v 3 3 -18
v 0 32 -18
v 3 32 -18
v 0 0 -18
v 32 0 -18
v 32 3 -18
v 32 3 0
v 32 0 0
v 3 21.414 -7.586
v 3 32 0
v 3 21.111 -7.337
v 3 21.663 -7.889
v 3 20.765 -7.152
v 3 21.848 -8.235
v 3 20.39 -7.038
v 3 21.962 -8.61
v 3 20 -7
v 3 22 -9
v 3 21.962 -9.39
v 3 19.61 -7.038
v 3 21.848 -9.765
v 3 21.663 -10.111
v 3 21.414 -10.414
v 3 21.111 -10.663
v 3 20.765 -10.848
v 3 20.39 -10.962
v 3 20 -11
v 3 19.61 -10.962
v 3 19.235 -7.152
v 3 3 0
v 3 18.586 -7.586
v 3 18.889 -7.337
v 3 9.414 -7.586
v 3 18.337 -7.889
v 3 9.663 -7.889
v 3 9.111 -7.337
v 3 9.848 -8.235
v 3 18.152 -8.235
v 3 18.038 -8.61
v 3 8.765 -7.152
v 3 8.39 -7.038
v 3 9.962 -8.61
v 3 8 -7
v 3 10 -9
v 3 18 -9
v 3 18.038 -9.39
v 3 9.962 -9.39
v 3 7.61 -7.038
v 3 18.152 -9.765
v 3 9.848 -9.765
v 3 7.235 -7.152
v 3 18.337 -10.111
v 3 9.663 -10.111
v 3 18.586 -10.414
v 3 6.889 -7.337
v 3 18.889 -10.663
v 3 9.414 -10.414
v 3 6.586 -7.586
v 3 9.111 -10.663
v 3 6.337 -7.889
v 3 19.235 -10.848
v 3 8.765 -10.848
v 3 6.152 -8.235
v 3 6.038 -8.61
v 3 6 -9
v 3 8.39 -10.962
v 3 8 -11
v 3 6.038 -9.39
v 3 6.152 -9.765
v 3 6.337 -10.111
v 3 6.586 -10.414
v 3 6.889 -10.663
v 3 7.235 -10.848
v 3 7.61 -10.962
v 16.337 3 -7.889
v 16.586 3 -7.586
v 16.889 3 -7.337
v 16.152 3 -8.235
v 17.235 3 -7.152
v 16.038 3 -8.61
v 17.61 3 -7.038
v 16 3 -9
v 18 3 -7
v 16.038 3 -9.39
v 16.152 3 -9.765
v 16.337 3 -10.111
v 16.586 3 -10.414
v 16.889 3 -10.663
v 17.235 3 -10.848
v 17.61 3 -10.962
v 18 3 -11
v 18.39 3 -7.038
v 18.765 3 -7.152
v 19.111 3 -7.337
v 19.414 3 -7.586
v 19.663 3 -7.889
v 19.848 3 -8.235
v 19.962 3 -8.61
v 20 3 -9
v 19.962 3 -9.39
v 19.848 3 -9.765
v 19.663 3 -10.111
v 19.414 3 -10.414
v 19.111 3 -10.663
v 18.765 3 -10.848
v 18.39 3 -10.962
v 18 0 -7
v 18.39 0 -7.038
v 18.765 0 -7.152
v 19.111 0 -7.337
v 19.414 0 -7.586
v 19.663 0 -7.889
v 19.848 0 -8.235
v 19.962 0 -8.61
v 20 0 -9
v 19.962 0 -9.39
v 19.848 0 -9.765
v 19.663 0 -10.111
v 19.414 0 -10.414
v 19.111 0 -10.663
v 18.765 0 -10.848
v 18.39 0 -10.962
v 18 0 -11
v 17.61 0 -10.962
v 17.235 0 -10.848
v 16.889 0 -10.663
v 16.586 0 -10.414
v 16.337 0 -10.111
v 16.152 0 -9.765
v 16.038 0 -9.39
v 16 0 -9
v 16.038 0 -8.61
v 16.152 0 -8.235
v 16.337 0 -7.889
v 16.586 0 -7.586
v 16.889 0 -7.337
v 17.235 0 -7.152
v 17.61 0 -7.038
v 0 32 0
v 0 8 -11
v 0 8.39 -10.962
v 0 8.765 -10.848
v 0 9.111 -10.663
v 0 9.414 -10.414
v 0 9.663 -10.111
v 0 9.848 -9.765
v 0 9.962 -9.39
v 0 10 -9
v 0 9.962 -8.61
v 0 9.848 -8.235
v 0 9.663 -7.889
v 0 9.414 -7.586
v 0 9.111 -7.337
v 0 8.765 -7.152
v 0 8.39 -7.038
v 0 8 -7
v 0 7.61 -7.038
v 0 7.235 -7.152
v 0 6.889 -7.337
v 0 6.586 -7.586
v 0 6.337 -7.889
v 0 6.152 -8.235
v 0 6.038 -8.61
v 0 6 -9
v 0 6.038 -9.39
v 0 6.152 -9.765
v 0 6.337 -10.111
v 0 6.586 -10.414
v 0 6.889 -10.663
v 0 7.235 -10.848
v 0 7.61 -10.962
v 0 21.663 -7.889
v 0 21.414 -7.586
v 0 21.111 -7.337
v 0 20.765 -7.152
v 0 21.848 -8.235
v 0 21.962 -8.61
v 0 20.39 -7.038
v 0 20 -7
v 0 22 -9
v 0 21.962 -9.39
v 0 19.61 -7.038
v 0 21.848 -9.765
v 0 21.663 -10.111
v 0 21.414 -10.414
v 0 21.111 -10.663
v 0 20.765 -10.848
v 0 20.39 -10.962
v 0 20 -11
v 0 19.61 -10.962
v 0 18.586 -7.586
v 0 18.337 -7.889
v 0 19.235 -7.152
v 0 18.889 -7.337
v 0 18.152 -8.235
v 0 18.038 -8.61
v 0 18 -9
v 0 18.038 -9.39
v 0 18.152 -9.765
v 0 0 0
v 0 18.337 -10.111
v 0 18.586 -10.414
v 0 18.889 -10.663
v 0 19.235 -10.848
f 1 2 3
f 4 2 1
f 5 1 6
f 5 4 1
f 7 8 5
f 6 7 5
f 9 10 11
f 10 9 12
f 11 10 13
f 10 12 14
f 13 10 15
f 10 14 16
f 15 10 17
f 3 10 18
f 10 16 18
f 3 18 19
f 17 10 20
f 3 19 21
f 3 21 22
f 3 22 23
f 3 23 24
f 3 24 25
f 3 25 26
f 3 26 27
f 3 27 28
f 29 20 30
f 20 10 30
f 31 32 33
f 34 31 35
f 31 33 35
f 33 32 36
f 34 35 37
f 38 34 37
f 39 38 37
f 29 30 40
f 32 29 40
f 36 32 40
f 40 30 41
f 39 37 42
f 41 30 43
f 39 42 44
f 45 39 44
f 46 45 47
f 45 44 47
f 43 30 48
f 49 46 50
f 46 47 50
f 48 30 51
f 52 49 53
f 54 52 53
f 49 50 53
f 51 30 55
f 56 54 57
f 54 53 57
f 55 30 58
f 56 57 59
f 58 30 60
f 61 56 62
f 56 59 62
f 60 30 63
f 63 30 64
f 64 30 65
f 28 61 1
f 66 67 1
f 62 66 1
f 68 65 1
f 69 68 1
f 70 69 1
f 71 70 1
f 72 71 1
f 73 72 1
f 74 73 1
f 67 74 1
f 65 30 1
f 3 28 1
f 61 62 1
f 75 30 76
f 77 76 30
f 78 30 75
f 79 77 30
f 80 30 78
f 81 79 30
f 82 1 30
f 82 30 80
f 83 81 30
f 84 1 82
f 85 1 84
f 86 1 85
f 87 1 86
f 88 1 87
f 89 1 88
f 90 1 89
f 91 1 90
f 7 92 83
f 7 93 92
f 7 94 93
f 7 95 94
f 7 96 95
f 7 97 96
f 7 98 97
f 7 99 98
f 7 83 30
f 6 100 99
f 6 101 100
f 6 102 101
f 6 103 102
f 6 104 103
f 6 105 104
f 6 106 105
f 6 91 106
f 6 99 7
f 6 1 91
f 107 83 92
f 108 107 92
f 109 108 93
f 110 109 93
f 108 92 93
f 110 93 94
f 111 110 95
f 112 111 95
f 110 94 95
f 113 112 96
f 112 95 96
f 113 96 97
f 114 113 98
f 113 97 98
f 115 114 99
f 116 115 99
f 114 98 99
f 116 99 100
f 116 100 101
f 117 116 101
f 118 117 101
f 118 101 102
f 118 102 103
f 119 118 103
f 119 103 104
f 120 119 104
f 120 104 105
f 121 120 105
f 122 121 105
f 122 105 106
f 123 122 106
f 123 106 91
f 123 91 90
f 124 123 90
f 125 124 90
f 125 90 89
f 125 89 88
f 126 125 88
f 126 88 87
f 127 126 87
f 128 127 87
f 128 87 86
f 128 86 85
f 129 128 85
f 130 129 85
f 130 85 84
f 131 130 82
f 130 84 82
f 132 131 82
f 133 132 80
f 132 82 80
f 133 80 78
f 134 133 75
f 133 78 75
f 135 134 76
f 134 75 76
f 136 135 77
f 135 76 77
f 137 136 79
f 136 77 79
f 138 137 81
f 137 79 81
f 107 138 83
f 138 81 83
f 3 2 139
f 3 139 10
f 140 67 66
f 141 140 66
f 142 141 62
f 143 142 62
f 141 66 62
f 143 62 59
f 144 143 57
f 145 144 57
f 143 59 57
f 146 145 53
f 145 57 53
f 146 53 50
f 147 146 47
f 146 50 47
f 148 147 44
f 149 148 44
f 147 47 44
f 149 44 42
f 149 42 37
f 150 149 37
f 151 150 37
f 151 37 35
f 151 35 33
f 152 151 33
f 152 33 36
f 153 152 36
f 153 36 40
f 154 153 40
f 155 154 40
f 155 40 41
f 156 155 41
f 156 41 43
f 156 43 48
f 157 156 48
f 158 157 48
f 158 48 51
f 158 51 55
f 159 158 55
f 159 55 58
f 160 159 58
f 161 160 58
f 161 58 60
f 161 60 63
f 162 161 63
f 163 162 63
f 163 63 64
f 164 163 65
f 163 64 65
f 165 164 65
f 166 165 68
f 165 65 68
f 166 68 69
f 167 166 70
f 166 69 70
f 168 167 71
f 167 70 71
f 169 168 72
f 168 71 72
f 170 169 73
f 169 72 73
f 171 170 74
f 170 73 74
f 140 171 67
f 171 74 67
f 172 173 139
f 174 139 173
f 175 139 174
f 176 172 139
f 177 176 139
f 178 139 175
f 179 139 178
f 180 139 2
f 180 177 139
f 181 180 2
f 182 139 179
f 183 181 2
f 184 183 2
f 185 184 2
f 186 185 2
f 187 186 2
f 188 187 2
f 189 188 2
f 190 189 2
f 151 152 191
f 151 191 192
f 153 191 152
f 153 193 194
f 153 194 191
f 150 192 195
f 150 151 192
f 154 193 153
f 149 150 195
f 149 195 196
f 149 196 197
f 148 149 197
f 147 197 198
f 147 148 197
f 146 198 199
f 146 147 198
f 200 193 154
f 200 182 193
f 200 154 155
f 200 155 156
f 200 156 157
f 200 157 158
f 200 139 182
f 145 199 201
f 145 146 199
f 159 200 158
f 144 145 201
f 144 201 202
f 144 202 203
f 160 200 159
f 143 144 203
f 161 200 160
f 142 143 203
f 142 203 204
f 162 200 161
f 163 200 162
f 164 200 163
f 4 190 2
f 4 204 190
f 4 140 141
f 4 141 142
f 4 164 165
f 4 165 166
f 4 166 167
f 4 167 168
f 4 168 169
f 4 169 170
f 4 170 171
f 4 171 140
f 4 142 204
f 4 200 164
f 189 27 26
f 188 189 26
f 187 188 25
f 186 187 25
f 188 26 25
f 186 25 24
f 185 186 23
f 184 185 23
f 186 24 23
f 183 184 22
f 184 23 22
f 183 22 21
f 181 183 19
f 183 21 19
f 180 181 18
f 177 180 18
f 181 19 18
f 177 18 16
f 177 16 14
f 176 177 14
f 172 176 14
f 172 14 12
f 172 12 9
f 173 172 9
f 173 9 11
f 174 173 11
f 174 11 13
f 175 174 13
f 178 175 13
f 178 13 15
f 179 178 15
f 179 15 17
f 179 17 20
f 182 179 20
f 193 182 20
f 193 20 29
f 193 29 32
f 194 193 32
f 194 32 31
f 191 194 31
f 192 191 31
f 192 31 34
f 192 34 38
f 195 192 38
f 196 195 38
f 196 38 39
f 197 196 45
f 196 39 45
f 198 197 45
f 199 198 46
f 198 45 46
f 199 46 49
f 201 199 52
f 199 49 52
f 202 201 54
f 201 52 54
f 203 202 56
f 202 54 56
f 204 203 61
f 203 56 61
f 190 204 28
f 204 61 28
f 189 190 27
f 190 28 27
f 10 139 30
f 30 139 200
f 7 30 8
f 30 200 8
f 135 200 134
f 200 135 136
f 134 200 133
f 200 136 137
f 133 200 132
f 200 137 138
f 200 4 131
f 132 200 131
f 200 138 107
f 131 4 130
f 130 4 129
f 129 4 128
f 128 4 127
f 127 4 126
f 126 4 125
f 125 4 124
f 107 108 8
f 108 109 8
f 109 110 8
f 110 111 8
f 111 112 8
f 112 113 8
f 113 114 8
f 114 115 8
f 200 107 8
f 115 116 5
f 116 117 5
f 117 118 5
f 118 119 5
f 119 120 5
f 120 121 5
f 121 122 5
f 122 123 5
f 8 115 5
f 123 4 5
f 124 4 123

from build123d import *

# Parameters (mm, degrees)
SKETCH1_W           = 32
SKETCH1_H           = 18
BOSS_EXTRUDE1_DEPTH = 3
SKETCH2_W           = 3
SKETCH2_H           = 18
BOSS_EXTRUDE2_DEPTH = 29
SKETCH3_R           = 2
CUT_EXTRUDE1_DEPTH  = 47.786750261
SKETCH4_R           = 2
CUT_EXTRUDE2_DEPTH  = 47.786750261


with BuildPart() as part:
    # Sketch1 → Boss-Extrude1 (new body)
    with BuildSketch(Plane(origin=(0, 0, 0), x_dir=(1, 0, 0), z_dir=(0, 1, 0))):
        with Locations((16, 9)):
            Rectangle(SKETCH1_W, SKETCH1_H)
    extrude(amount=BOSS_EXTRUDE1_DEPTH)

    # Sketch2 → Boss-Extrude2 (add)
    with BuildSketch(Plane(origin=(0, 3, 0), x_dir=(1, 0, 0), z_dir=(0, 1, 0))):
        with Locations((1.5, 9)):
            Rectangle(SKETCH2_W, SKETCH2_H)
    extrude(amount=BOSS_EXTRUDE2_DEPTH)

    # Sketch3 → Cut-Extrude1 (cut, through all)
    with BuildSketch(Plane(origin=(0, 3, 0), x_dir=(1, 0, 0), z_dir=(0, 1, 0))):
        with Locations(Location((18, 9, 0), (0, 0, 270))):
            Circle(SKETCH3_R)
    extrude(amount=-CUT_EXTRUDE1_DEPTH, mode=Mode.SUBTRACT)

    # Sketch4 → Cut-Extrude2 (cut, through all)
    with BuildSketch(Plane(origin=(3, 0, 0), x_dir=(0, 0, -1), z_dir=(1, 0, 0))):
        with Locations((9, 20)):
            Circle(SKETCH4_R)
        with Locations((9, 8)):
            Circle(SKETCH4_R)
    extrude(amount=-CUT_EXTRUDE2_DEPTH, mode=Mode.SUBTRACT)


solid = part.part
